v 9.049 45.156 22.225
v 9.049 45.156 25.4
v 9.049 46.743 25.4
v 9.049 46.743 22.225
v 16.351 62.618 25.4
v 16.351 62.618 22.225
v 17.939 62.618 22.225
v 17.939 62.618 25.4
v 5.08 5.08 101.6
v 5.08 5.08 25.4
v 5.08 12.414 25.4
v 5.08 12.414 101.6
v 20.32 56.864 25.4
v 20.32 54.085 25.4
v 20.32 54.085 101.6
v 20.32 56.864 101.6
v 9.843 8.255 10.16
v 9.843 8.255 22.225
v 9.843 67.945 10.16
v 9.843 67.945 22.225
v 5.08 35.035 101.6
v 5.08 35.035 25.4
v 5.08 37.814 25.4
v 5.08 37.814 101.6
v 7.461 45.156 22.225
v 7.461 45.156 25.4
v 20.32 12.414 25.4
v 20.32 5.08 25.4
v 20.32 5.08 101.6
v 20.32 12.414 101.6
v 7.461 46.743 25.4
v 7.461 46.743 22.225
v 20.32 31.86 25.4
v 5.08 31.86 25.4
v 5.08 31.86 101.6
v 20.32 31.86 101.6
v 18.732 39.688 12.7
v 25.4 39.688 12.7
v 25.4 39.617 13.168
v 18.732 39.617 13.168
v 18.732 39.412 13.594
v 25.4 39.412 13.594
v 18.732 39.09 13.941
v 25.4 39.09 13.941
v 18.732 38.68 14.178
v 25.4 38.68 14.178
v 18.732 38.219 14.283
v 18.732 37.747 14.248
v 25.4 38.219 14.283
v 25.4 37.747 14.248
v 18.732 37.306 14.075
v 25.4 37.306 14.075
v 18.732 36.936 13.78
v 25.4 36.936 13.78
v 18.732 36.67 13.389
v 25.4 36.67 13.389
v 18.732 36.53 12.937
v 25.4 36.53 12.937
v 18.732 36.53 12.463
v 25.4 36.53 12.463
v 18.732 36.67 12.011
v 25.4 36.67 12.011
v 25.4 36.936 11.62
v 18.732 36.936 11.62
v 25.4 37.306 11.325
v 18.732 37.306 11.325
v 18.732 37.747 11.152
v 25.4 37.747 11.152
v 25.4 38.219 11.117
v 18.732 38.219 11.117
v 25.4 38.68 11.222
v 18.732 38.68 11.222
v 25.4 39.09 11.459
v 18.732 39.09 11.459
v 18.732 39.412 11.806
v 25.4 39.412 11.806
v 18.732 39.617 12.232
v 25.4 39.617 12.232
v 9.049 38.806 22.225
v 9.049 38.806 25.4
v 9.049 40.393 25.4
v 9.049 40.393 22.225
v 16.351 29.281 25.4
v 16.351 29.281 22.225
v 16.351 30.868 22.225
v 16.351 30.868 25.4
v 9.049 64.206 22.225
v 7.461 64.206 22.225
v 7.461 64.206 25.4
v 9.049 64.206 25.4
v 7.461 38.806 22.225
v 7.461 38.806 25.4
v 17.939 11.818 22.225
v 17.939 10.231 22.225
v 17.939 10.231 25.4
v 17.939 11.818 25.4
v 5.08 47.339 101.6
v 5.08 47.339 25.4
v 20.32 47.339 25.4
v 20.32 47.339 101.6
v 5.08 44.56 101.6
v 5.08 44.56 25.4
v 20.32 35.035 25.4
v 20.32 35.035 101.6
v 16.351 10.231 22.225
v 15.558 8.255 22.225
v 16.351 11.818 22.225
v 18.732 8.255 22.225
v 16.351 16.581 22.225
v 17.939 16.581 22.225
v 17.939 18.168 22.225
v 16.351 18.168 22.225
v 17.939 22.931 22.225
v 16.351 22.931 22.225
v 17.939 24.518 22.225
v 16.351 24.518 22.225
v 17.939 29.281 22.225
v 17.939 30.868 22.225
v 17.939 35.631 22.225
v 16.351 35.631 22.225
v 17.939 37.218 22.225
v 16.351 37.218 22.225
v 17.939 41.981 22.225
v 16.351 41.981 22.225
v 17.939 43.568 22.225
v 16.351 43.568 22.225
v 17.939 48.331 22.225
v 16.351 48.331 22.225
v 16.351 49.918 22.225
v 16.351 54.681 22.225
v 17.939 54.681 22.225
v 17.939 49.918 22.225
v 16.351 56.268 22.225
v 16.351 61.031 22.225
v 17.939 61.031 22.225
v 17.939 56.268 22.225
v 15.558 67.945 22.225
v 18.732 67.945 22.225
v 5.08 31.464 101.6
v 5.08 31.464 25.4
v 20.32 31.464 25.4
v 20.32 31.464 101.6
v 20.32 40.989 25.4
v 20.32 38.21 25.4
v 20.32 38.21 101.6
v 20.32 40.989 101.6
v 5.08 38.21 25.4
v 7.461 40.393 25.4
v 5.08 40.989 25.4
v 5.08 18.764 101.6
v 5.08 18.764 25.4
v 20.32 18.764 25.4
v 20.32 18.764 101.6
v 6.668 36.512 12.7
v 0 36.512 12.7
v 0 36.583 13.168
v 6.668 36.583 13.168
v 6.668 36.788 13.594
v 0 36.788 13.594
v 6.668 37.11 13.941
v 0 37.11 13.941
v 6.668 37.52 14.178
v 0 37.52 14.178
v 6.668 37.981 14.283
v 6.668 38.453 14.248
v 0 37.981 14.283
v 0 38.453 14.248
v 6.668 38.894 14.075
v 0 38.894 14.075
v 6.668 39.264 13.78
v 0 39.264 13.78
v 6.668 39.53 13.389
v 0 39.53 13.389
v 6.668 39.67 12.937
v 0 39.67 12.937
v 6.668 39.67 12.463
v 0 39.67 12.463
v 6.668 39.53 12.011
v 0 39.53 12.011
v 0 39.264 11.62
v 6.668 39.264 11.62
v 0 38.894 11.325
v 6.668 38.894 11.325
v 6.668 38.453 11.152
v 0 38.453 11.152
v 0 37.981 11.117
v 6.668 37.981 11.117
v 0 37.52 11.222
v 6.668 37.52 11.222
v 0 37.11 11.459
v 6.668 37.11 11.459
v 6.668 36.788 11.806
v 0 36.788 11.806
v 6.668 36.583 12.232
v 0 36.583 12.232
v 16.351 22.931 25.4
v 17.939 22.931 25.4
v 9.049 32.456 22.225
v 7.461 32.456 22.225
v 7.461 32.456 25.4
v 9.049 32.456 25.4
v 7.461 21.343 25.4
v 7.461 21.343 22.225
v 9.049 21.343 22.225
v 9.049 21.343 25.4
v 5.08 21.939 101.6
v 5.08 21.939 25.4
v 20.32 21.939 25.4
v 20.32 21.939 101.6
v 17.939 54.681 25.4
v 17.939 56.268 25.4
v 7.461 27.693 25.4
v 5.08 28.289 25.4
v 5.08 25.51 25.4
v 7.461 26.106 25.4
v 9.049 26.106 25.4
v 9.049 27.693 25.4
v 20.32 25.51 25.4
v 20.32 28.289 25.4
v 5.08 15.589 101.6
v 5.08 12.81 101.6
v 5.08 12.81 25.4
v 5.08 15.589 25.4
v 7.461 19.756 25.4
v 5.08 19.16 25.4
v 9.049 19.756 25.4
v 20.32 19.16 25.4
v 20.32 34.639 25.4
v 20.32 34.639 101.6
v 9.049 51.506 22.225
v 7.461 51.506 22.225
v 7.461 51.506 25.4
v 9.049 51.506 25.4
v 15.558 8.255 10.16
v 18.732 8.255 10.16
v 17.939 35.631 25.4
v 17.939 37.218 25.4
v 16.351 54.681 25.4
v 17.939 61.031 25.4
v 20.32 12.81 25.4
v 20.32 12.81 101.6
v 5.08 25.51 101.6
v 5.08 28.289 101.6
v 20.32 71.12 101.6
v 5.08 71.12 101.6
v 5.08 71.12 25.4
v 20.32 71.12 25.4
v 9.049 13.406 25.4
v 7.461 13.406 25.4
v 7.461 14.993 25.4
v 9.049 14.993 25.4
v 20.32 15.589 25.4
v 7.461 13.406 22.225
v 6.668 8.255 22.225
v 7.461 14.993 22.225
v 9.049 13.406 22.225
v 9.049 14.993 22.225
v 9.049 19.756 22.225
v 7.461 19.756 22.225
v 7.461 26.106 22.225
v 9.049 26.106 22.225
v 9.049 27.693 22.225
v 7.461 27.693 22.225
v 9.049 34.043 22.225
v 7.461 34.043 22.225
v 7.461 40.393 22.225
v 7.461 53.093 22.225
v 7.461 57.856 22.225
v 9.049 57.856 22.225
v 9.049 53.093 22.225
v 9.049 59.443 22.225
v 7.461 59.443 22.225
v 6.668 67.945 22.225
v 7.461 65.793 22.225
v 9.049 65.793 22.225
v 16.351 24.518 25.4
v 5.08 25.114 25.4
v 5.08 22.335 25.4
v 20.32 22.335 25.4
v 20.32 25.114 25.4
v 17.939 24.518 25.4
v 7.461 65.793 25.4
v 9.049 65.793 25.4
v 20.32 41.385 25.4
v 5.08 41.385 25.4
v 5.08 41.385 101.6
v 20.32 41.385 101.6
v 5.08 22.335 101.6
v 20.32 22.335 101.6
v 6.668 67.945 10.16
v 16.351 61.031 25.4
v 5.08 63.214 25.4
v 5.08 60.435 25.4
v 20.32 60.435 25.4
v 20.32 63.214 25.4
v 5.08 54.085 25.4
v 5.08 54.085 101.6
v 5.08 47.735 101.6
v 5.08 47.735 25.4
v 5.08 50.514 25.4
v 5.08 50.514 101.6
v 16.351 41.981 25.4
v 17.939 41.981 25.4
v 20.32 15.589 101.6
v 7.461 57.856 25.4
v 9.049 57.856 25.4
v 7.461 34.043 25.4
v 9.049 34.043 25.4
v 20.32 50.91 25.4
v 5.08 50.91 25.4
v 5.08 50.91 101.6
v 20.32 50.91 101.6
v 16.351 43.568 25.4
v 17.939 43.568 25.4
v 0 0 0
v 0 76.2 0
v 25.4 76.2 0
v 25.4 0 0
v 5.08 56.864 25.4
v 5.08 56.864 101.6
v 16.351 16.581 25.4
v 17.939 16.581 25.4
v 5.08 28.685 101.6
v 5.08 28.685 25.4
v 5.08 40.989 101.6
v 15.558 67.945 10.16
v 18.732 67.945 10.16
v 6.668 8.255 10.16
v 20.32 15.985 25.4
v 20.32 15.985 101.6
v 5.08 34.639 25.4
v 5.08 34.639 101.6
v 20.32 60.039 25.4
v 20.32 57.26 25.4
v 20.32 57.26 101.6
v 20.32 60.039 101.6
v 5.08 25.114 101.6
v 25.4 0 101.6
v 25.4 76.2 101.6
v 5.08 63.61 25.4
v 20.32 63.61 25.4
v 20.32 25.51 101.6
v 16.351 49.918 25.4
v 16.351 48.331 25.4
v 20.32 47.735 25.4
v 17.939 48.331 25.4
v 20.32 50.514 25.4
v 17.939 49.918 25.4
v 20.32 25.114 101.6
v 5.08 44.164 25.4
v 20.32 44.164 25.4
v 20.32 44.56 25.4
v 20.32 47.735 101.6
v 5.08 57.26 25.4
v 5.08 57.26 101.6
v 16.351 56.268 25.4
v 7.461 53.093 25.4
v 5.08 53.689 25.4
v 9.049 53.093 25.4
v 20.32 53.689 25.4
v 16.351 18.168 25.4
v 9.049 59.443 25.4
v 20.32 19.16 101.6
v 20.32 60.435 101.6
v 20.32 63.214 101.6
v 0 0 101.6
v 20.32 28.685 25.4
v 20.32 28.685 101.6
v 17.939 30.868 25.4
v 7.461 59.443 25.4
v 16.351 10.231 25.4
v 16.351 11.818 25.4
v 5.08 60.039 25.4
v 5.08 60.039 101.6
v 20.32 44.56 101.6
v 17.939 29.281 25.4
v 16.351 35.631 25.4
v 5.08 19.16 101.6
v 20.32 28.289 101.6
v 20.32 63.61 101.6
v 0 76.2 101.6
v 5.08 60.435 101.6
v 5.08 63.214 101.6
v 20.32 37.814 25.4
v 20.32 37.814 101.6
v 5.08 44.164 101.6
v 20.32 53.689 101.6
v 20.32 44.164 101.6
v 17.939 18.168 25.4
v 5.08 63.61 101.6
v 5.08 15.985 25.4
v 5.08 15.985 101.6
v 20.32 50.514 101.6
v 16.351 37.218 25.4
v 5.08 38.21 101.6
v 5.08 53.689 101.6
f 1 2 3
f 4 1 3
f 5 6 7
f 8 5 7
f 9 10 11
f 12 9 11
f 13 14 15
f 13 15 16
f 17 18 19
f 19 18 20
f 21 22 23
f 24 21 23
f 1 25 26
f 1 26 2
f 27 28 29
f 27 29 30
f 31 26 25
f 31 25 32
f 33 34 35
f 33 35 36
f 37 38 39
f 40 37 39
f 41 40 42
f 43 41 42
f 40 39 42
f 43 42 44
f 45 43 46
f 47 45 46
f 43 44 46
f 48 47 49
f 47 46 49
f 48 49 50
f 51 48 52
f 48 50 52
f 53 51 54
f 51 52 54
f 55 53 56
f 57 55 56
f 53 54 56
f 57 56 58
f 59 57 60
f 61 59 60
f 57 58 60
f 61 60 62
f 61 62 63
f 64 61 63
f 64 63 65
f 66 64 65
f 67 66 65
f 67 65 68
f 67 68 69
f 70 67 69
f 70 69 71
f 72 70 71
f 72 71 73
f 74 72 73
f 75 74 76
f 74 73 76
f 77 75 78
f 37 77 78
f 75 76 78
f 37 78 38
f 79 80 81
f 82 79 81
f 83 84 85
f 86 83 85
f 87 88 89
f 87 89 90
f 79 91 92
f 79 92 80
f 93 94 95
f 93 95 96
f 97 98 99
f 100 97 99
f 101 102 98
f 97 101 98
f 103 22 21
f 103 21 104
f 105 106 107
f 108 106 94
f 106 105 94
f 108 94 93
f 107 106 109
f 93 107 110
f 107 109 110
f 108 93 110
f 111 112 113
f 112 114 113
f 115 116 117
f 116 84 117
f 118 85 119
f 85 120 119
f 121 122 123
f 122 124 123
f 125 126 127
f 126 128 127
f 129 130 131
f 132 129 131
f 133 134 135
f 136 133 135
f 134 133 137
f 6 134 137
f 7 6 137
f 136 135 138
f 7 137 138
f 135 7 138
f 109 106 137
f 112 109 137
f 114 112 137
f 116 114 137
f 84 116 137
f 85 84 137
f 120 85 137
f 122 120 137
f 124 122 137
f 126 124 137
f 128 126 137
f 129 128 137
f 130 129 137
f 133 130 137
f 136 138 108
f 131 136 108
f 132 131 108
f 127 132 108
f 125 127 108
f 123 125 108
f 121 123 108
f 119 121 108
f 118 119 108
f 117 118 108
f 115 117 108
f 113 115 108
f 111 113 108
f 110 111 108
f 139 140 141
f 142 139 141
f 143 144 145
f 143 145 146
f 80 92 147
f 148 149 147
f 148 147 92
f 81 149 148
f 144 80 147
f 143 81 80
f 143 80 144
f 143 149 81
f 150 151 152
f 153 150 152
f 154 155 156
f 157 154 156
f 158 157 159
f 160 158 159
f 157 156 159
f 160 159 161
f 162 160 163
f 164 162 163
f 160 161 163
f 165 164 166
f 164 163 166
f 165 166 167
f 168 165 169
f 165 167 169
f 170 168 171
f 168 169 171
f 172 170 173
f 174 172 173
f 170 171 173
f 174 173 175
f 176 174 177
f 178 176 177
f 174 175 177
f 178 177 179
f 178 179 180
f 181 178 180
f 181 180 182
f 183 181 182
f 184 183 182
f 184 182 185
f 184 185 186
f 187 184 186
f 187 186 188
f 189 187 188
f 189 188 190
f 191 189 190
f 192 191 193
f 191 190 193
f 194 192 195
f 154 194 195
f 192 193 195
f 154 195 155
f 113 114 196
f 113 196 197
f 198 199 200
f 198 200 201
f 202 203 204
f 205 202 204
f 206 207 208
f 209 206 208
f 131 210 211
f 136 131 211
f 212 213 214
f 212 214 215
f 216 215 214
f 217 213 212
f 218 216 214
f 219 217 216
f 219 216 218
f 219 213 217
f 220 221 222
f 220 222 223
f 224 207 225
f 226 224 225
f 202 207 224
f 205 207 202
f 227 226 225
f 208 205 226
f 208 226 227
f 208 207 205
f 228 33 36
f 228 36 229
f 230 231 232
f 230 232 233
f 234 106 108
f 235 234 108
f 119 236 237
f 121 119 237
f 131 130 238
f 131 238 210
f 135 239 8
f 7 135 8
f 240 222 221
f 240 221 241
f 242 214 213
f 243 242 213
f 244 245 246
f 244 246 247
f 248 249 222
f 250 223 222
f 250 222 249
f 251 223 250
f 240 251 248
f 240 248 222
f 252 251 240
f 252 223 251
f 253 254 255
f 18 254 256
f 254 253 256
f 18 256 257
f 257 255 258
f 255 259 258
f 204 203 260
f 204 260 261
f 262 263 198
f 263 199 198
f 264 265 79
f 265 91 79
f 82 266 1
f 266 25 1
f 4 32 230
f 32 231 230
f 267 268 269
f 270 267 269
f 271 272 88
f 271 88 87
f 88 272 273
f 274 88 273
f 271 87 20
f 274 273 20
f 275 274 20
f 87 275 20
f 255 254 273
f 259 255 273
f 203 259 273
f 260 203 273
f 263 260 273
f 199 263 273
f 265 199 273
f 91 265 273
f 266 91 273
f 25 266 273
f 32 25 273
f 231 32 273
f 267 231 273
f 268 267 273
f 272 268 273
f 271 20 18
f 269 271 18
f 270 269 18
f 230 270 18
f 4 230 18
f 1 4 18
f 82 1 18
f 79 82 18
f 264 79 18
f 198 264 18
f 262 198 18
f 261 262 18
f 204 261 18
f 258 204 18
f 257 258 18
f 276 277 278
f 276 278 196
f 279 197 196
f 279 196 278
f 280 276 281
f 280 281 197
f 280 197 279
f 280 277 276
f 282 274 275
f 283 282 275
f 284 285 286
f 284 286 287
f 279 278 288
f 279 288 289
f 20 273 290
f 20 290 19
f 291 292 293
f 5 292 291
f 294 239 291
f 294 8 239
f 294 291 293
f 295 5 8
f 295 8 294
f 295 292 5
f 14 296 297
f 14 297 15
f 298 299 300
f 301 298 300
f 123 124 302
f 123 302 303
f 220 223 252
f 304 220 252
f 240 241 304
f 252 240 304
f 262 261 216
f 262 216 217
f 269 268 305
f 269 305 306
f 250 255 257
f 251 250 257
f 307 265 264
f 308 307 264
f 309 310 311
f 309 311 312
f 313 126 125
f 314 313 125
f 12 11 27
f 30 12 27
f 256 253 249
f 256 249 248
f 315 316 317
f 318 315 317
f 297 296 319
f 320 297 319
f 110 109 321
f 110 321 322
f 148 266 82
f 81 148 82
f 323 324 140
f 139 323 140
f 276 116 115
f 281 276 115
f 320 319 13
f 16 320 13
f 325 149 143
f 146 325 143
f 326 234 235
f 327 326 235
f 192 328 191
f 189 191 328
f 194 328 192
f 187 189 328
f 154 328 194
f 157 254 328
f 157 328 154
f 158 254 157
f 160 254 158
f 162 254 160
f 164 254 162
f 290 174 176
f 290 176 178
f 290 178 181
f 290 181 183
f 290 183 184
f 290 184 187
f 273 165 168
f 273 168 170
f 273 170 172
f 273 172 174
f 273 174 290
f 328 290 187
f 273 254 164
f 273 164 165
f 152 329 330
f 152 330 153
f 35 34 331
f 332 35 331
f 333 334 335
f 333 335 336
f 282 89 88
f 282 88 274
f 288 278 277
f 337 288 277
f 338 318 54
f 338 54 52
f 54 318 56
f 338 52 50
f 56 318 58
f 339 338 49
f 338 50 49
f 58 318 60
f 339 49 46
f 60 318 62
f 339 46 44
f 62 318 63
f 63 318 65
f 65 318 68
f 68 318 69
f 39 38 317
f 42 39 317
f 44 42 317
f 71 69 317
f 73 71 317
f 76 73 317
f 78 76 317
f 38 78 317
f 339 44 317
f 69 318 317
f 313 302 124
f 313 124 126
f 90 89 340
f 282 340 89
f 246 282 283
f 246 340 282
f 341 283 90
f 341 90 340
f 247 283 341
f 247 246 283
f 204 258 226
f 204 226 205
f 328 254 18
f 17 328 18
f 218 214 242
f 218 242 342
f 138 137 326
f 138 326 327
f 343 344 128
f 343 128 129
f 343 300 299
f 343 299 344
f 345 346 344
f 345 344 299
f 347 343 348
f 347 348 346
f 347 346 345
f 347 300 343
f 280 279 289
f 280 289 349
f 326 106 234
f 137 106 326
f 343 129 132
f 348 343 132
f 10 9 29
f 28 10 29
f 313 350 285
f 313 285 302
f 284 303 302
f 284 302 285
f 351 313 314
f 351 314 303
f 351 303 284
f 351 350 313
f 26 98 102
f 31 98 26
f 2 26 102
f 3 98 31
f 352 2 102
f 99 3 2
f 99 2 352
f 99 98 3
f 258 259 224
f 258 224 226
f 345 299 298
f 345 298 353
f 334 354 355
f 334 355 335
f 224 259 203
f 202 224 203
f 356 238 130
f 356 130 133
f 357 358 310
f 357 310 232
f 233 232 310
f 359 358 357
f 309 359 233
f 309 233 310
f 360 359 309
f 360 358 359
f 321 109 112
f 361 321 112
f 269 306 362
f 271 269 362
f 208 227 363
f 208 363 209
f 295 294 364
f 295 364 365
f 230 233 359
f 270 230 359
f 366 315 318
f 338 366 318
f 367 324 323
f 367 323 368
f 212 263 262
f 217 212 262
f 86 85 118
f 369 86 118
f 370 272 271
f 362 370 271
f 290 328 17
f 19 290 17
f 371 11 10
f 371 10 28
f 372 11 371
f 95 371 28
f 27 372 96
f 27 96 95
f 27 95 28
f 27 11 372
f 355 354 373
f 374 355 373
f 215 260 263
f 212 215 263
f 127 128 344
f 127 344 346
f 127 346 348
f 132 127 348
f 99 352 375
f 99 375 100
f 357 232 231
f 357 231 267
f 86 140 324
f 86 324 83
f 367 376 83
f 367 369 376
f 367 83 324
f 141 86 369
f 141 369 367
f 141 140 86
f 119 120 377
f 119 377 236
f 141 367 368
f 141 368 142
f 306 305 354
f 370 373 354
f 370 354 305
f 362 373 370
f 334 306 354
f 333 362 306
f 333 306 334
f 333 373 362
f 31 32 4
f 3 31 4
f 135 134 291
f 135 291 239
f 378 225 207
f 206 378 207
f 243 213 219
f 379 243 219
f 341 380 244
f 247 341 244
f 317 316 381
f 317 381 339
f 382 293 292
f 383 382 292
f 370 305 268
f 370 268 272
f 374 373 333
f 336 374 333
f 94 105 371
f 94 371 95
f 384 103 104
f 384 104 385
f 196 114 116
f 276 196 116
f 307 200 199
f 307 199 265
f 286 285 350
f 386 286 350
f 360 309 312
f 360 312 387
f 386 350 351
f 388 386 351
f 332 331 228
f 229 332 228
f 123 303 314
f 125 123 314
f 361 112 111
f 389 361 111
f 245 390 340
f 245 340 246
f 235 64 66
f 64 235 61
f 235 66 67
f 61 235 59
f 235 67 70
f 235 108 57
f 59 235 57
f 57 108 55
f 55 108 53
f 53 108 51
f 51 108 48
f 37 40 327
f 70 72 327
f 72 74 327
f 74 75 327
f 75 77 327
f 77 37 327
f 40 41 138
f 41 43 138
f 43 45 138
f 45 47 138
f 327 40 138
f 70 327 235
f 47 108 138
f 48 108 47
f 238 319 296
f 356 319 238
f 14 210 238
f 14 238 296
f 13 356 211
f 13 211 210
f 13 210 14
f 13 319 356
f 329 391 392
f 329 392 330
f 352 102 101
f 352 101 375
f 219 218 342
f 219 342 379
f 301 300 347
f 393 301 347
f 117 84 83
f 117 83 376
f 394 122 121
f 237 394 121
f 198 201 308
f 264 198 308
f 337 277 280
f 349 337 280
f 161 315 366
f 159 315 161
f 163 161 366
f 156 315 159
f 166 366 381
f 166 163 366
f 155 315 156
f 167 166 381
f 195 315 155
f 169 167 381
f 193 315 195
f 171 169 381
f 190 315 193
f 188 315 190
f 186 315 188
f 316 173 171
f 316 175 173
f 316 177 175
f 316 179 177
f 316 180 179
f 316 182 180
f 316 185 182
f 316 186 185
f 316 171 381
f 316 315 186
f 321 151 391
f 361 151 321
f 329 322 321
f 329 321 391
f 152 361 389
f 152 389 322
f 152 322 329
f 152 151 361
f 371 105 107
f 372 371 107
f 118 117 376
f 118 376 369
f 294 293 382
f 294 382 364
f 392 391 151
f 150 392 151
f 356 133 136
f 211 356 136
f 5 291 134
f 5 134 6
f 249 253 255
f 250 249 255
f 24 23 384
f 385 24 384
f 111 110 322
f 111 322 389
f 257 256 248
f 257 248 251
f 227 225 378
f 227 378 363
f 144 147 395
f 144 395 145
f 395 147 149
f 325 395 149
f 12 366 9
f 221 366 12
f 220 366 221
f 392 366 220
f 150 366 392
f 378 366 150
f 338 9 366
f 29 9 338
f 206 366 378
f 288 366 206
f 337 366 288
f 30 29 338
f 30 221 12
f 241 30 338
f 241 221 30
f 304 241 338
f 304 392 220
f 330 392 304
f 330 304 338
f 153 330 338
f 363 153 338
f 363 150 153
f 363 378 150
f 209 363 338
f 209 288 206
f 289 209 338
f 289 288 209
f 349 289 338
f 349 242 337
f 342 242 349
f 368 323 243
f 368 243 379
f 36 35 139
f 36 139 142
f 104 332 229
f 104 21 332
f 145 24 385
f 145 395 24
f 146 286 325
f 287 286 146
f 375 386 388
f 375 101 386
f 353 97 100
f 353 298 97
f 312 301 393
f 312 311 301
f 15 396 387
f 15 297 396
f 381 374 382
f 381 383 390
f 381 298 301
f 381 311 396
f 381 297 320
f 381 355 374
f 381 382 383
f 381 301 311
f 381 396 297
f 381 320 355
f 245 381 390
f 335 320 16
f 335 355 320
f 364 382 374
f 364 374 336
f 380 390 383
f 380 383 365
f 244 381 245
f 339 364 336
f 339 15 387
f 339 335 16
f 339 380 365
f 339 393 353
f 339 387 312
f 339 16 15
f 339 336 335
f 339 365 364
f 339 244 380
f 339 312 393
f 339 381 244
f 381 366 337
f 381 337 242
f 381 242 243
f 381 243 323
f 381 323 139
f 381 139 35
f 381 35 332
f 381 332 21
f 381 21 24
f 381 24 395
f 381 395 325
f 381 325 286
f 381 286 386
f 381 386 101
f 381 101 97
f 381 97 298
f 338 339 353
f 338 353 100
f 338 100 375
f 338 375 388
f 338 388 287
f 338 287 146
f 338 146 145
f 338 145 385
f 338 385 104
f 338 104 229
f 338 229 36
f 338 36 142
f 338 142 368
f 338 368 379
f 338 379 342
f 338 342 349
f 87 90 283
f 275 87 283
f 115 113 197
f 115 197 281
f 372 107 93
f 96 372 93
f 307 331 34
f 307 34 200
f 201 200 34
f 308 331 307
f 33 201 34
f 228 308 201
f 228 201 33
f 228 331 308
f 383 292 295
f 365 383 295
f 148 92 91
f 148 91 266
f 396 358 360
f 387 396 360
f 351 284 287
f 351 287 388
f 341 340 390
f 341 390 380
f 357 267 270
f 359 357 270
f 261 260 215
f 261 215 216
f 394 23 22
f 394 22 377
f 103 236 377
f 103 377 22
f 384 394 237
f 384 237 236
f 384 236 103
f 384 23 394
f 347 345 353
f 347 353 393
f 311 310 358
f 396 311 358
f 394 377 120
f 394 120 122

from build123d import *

# Parameters (mm, degrees)
F0_W      = 25.4
F0_H      = 76.2
F1_DEPTH  = 101.6
F2_W      = 15.24
F2_H      = 66.04
F3_DEPTH  = 76.2
F6_START  = -3.175
F5_W      = 3.175
F5_H      = 59.69
F6_DEPTH  = 12.065
F4_R      = 1.5875
F7_DEPTH  = 6.6675
F8_R      = 1.5875
F9_DEPTH  = 6.6675
F10_W     = 1.5875
F10_H     = 1.5875
F11_DEPTH = 3.175
F12_W     = 1.5875
F12_H     = 1.5875
F13_DEPTH = 3.175
F14_W     = 15.24
F14_H     = 0.396875
F15_DEPTH = 76.2


with BuildPart() as f1:
    # F0 (on Top) → F1 (new body)
    with BuildSketch(Plane.XY):
        with Locations((12.7, 38.1)):
            Rectangle(F0_W, F0_H)
    extrude(amount=F1_DEPTH)

    # F2 (on face) → F3 (cut)
    with BuildSketch(Plane.XY.offset(101.6)):
        with Locations((12.7, 38.1)):
            Rectangle(F2_W, F2_H)
    extrude(amount=-F3_DEPTH, mode=Mode.SUBTRACT)

    # F5 (on face) → F6 (cut)
    with BuildSketch(Plane.XY.offset(25.4).offset(F6_START)):
        with Locations((17.145, 38.1)):
            Rectangle(F5_W, F5_H)
        with Locations((8.255, 38.1)):
            Rectangle(F5_W, F5_H)
    extrude(amount=-F6_DEPTH, mode=Mode.SUBTRACT)

    # F4 (on face) → F7 (cut, through all)
    with BuildSketch(Plane.YZ.offset(25.4)):
        with Locations((38.1, 12.7)):
            Circle(F4_R)
    extrude(amount=-F7_DEPTH, mode=Mode.SUBTRACT)

    # F8 (on face) → F9 (cut, through all)
    with BuildSketch(Plane(origin=(0, 0, 0), x_dir=(0, -1, 0), z_dir=(-1, 0, 0))):
        with Locations((-38.1, 12.7)):
            Circle(F8_R)
    extrude(amount=-F9_DEPTH, mode=Mode.SUBTRACT)

    # F10 (on face) → F11 (cut, through all)
    with BuildSketch(Plane.XY.offset(25.4)):
        with Locations((8.255, 64.9995461683)):
            Rectangle(F10_W, F10_H)
        with Locations((8.255, 58.6495461683)):
            Rectangle(F10_W, F10_H)
        with Locations((8.255, 52.2995461683)):
            Rectangle(F10_W, F10_H)
        with Locations((8.255, 45.9495461683)):
            Rectangle(F10_W, F10_H)
        with Locations((8.255, 39.5995461683)):
            Rectangle(F10_W, F10_H)
        with Locations((8.255, 33.2495461683)):
            Rectangle(F10_W, F10_H)
        with Locations((8.255, 26.8995461683)):
            Rectangle(F10_W, F10_H)
        with Locations((8.255, 20.5495461683)):
            Rectangle(F10_W, F10_H)
        with Locations((8.255, 14.1995461683)):
            Rectangle(F10_W, F10_H)
    extrude(amount=-F11_DEPTH, mode=Mode.SUBTRACT)

    # F12 (on face) → F13 (cut, through all)
    with BuildSketch(Plane.XY.offset(25.4)):
        with Locations((17.145, 61.8245461683)):
            Rectangle(F12_W, F12_H)
        with Locations((17.145, 55.4745461683)):
            Rectangle(F12_W, F12_H)
        with Locations((17.145, 49.1245461683)):
            Rectangle(F12_W, F12_H)
        with Locations((17.145, 42.7745461683)):
            Rectangle(F12_W, F12_H)
        with Locations((17.145, 36.4245461683)):
            Rectangle(F12_W, F12_H)
        with Locations((17.145, 30.0745461683)):
            Rectangle(F12_W, F12_H)
        with Locations((17.145, 23.7245461683)):
            Rectangle(F12_W, F12_H)
        with Locations((17.145, 17.3745461683)):
            Rectangle(F12_W, F12_H)
        with Locations((17.145, 11.0245461683)):
            Rectangle(F12_W, F12_H)
    extrude(amount=-F13_DEPTH, mode=Mode.SUBTRACT)

    # F14 (on face) → F15 (join, through all)
    with BuildSketch(Plane.XY.offset(25.4)):
        with Locations((12.7, 63.4120461683)):
            Rectangle(F14_W, F14_H)
        with Locations((12.7, 60.2370461683)):
            Rectangle(F14_W, F14_H)
        with Locations((12.7, 57.0620461683)):
            Rectangle(F14_W, F14_H)
        with Locations((12.7, 53.8870461683)):
            Rectangle(F14_W, F14_H)
        with Locations((12.7, 50.7120461683)):
            Rectangle(F14_W, F14_H)
        with Locations((12.7, 47.5370461683)):
            Rectangle(F14_W, F14_H)
        with Locations((12.7, 44.3620461683)):
            Rectangle(F14_W, F14_H)
        with Locations((12.7, 41.1870461683)):
            Rectangle(F14_W, F14_H)
        with Locations((12.7, 38.0120461683)):
            Rectangle(F14_W, F14_H)
        with Locations((12.7, 34.8370461683)):
            Rectangle(F14_W, F14_H)
        with Locations((12.7, 31.6620461683)):
            Rectangle(F14_W, F14_H)
        with Locations((12.7, 28.4870461683)):
            Rectangle(F14_W, F14_H)
        with Locations((12.7, 25.3120461683)):
            Rectangle(F14_W, F14_H)
        with Locations((12.7, 22.1370461683)):
            Rectangle(F14_W, F14_H)
        with Locations((12.7, 18.9620461683)):
            Rectangle(F14_W, F14_H)
        with Locations((12.7, 15.7870461683)):
            Rectangle(F14_W, F14_H)
        with Locations((12.7, 12.6120461683)):
            Rectangle(F14_W, F14_H)
    extrude(amount=F15_DEPTH)


solid = f1.part
